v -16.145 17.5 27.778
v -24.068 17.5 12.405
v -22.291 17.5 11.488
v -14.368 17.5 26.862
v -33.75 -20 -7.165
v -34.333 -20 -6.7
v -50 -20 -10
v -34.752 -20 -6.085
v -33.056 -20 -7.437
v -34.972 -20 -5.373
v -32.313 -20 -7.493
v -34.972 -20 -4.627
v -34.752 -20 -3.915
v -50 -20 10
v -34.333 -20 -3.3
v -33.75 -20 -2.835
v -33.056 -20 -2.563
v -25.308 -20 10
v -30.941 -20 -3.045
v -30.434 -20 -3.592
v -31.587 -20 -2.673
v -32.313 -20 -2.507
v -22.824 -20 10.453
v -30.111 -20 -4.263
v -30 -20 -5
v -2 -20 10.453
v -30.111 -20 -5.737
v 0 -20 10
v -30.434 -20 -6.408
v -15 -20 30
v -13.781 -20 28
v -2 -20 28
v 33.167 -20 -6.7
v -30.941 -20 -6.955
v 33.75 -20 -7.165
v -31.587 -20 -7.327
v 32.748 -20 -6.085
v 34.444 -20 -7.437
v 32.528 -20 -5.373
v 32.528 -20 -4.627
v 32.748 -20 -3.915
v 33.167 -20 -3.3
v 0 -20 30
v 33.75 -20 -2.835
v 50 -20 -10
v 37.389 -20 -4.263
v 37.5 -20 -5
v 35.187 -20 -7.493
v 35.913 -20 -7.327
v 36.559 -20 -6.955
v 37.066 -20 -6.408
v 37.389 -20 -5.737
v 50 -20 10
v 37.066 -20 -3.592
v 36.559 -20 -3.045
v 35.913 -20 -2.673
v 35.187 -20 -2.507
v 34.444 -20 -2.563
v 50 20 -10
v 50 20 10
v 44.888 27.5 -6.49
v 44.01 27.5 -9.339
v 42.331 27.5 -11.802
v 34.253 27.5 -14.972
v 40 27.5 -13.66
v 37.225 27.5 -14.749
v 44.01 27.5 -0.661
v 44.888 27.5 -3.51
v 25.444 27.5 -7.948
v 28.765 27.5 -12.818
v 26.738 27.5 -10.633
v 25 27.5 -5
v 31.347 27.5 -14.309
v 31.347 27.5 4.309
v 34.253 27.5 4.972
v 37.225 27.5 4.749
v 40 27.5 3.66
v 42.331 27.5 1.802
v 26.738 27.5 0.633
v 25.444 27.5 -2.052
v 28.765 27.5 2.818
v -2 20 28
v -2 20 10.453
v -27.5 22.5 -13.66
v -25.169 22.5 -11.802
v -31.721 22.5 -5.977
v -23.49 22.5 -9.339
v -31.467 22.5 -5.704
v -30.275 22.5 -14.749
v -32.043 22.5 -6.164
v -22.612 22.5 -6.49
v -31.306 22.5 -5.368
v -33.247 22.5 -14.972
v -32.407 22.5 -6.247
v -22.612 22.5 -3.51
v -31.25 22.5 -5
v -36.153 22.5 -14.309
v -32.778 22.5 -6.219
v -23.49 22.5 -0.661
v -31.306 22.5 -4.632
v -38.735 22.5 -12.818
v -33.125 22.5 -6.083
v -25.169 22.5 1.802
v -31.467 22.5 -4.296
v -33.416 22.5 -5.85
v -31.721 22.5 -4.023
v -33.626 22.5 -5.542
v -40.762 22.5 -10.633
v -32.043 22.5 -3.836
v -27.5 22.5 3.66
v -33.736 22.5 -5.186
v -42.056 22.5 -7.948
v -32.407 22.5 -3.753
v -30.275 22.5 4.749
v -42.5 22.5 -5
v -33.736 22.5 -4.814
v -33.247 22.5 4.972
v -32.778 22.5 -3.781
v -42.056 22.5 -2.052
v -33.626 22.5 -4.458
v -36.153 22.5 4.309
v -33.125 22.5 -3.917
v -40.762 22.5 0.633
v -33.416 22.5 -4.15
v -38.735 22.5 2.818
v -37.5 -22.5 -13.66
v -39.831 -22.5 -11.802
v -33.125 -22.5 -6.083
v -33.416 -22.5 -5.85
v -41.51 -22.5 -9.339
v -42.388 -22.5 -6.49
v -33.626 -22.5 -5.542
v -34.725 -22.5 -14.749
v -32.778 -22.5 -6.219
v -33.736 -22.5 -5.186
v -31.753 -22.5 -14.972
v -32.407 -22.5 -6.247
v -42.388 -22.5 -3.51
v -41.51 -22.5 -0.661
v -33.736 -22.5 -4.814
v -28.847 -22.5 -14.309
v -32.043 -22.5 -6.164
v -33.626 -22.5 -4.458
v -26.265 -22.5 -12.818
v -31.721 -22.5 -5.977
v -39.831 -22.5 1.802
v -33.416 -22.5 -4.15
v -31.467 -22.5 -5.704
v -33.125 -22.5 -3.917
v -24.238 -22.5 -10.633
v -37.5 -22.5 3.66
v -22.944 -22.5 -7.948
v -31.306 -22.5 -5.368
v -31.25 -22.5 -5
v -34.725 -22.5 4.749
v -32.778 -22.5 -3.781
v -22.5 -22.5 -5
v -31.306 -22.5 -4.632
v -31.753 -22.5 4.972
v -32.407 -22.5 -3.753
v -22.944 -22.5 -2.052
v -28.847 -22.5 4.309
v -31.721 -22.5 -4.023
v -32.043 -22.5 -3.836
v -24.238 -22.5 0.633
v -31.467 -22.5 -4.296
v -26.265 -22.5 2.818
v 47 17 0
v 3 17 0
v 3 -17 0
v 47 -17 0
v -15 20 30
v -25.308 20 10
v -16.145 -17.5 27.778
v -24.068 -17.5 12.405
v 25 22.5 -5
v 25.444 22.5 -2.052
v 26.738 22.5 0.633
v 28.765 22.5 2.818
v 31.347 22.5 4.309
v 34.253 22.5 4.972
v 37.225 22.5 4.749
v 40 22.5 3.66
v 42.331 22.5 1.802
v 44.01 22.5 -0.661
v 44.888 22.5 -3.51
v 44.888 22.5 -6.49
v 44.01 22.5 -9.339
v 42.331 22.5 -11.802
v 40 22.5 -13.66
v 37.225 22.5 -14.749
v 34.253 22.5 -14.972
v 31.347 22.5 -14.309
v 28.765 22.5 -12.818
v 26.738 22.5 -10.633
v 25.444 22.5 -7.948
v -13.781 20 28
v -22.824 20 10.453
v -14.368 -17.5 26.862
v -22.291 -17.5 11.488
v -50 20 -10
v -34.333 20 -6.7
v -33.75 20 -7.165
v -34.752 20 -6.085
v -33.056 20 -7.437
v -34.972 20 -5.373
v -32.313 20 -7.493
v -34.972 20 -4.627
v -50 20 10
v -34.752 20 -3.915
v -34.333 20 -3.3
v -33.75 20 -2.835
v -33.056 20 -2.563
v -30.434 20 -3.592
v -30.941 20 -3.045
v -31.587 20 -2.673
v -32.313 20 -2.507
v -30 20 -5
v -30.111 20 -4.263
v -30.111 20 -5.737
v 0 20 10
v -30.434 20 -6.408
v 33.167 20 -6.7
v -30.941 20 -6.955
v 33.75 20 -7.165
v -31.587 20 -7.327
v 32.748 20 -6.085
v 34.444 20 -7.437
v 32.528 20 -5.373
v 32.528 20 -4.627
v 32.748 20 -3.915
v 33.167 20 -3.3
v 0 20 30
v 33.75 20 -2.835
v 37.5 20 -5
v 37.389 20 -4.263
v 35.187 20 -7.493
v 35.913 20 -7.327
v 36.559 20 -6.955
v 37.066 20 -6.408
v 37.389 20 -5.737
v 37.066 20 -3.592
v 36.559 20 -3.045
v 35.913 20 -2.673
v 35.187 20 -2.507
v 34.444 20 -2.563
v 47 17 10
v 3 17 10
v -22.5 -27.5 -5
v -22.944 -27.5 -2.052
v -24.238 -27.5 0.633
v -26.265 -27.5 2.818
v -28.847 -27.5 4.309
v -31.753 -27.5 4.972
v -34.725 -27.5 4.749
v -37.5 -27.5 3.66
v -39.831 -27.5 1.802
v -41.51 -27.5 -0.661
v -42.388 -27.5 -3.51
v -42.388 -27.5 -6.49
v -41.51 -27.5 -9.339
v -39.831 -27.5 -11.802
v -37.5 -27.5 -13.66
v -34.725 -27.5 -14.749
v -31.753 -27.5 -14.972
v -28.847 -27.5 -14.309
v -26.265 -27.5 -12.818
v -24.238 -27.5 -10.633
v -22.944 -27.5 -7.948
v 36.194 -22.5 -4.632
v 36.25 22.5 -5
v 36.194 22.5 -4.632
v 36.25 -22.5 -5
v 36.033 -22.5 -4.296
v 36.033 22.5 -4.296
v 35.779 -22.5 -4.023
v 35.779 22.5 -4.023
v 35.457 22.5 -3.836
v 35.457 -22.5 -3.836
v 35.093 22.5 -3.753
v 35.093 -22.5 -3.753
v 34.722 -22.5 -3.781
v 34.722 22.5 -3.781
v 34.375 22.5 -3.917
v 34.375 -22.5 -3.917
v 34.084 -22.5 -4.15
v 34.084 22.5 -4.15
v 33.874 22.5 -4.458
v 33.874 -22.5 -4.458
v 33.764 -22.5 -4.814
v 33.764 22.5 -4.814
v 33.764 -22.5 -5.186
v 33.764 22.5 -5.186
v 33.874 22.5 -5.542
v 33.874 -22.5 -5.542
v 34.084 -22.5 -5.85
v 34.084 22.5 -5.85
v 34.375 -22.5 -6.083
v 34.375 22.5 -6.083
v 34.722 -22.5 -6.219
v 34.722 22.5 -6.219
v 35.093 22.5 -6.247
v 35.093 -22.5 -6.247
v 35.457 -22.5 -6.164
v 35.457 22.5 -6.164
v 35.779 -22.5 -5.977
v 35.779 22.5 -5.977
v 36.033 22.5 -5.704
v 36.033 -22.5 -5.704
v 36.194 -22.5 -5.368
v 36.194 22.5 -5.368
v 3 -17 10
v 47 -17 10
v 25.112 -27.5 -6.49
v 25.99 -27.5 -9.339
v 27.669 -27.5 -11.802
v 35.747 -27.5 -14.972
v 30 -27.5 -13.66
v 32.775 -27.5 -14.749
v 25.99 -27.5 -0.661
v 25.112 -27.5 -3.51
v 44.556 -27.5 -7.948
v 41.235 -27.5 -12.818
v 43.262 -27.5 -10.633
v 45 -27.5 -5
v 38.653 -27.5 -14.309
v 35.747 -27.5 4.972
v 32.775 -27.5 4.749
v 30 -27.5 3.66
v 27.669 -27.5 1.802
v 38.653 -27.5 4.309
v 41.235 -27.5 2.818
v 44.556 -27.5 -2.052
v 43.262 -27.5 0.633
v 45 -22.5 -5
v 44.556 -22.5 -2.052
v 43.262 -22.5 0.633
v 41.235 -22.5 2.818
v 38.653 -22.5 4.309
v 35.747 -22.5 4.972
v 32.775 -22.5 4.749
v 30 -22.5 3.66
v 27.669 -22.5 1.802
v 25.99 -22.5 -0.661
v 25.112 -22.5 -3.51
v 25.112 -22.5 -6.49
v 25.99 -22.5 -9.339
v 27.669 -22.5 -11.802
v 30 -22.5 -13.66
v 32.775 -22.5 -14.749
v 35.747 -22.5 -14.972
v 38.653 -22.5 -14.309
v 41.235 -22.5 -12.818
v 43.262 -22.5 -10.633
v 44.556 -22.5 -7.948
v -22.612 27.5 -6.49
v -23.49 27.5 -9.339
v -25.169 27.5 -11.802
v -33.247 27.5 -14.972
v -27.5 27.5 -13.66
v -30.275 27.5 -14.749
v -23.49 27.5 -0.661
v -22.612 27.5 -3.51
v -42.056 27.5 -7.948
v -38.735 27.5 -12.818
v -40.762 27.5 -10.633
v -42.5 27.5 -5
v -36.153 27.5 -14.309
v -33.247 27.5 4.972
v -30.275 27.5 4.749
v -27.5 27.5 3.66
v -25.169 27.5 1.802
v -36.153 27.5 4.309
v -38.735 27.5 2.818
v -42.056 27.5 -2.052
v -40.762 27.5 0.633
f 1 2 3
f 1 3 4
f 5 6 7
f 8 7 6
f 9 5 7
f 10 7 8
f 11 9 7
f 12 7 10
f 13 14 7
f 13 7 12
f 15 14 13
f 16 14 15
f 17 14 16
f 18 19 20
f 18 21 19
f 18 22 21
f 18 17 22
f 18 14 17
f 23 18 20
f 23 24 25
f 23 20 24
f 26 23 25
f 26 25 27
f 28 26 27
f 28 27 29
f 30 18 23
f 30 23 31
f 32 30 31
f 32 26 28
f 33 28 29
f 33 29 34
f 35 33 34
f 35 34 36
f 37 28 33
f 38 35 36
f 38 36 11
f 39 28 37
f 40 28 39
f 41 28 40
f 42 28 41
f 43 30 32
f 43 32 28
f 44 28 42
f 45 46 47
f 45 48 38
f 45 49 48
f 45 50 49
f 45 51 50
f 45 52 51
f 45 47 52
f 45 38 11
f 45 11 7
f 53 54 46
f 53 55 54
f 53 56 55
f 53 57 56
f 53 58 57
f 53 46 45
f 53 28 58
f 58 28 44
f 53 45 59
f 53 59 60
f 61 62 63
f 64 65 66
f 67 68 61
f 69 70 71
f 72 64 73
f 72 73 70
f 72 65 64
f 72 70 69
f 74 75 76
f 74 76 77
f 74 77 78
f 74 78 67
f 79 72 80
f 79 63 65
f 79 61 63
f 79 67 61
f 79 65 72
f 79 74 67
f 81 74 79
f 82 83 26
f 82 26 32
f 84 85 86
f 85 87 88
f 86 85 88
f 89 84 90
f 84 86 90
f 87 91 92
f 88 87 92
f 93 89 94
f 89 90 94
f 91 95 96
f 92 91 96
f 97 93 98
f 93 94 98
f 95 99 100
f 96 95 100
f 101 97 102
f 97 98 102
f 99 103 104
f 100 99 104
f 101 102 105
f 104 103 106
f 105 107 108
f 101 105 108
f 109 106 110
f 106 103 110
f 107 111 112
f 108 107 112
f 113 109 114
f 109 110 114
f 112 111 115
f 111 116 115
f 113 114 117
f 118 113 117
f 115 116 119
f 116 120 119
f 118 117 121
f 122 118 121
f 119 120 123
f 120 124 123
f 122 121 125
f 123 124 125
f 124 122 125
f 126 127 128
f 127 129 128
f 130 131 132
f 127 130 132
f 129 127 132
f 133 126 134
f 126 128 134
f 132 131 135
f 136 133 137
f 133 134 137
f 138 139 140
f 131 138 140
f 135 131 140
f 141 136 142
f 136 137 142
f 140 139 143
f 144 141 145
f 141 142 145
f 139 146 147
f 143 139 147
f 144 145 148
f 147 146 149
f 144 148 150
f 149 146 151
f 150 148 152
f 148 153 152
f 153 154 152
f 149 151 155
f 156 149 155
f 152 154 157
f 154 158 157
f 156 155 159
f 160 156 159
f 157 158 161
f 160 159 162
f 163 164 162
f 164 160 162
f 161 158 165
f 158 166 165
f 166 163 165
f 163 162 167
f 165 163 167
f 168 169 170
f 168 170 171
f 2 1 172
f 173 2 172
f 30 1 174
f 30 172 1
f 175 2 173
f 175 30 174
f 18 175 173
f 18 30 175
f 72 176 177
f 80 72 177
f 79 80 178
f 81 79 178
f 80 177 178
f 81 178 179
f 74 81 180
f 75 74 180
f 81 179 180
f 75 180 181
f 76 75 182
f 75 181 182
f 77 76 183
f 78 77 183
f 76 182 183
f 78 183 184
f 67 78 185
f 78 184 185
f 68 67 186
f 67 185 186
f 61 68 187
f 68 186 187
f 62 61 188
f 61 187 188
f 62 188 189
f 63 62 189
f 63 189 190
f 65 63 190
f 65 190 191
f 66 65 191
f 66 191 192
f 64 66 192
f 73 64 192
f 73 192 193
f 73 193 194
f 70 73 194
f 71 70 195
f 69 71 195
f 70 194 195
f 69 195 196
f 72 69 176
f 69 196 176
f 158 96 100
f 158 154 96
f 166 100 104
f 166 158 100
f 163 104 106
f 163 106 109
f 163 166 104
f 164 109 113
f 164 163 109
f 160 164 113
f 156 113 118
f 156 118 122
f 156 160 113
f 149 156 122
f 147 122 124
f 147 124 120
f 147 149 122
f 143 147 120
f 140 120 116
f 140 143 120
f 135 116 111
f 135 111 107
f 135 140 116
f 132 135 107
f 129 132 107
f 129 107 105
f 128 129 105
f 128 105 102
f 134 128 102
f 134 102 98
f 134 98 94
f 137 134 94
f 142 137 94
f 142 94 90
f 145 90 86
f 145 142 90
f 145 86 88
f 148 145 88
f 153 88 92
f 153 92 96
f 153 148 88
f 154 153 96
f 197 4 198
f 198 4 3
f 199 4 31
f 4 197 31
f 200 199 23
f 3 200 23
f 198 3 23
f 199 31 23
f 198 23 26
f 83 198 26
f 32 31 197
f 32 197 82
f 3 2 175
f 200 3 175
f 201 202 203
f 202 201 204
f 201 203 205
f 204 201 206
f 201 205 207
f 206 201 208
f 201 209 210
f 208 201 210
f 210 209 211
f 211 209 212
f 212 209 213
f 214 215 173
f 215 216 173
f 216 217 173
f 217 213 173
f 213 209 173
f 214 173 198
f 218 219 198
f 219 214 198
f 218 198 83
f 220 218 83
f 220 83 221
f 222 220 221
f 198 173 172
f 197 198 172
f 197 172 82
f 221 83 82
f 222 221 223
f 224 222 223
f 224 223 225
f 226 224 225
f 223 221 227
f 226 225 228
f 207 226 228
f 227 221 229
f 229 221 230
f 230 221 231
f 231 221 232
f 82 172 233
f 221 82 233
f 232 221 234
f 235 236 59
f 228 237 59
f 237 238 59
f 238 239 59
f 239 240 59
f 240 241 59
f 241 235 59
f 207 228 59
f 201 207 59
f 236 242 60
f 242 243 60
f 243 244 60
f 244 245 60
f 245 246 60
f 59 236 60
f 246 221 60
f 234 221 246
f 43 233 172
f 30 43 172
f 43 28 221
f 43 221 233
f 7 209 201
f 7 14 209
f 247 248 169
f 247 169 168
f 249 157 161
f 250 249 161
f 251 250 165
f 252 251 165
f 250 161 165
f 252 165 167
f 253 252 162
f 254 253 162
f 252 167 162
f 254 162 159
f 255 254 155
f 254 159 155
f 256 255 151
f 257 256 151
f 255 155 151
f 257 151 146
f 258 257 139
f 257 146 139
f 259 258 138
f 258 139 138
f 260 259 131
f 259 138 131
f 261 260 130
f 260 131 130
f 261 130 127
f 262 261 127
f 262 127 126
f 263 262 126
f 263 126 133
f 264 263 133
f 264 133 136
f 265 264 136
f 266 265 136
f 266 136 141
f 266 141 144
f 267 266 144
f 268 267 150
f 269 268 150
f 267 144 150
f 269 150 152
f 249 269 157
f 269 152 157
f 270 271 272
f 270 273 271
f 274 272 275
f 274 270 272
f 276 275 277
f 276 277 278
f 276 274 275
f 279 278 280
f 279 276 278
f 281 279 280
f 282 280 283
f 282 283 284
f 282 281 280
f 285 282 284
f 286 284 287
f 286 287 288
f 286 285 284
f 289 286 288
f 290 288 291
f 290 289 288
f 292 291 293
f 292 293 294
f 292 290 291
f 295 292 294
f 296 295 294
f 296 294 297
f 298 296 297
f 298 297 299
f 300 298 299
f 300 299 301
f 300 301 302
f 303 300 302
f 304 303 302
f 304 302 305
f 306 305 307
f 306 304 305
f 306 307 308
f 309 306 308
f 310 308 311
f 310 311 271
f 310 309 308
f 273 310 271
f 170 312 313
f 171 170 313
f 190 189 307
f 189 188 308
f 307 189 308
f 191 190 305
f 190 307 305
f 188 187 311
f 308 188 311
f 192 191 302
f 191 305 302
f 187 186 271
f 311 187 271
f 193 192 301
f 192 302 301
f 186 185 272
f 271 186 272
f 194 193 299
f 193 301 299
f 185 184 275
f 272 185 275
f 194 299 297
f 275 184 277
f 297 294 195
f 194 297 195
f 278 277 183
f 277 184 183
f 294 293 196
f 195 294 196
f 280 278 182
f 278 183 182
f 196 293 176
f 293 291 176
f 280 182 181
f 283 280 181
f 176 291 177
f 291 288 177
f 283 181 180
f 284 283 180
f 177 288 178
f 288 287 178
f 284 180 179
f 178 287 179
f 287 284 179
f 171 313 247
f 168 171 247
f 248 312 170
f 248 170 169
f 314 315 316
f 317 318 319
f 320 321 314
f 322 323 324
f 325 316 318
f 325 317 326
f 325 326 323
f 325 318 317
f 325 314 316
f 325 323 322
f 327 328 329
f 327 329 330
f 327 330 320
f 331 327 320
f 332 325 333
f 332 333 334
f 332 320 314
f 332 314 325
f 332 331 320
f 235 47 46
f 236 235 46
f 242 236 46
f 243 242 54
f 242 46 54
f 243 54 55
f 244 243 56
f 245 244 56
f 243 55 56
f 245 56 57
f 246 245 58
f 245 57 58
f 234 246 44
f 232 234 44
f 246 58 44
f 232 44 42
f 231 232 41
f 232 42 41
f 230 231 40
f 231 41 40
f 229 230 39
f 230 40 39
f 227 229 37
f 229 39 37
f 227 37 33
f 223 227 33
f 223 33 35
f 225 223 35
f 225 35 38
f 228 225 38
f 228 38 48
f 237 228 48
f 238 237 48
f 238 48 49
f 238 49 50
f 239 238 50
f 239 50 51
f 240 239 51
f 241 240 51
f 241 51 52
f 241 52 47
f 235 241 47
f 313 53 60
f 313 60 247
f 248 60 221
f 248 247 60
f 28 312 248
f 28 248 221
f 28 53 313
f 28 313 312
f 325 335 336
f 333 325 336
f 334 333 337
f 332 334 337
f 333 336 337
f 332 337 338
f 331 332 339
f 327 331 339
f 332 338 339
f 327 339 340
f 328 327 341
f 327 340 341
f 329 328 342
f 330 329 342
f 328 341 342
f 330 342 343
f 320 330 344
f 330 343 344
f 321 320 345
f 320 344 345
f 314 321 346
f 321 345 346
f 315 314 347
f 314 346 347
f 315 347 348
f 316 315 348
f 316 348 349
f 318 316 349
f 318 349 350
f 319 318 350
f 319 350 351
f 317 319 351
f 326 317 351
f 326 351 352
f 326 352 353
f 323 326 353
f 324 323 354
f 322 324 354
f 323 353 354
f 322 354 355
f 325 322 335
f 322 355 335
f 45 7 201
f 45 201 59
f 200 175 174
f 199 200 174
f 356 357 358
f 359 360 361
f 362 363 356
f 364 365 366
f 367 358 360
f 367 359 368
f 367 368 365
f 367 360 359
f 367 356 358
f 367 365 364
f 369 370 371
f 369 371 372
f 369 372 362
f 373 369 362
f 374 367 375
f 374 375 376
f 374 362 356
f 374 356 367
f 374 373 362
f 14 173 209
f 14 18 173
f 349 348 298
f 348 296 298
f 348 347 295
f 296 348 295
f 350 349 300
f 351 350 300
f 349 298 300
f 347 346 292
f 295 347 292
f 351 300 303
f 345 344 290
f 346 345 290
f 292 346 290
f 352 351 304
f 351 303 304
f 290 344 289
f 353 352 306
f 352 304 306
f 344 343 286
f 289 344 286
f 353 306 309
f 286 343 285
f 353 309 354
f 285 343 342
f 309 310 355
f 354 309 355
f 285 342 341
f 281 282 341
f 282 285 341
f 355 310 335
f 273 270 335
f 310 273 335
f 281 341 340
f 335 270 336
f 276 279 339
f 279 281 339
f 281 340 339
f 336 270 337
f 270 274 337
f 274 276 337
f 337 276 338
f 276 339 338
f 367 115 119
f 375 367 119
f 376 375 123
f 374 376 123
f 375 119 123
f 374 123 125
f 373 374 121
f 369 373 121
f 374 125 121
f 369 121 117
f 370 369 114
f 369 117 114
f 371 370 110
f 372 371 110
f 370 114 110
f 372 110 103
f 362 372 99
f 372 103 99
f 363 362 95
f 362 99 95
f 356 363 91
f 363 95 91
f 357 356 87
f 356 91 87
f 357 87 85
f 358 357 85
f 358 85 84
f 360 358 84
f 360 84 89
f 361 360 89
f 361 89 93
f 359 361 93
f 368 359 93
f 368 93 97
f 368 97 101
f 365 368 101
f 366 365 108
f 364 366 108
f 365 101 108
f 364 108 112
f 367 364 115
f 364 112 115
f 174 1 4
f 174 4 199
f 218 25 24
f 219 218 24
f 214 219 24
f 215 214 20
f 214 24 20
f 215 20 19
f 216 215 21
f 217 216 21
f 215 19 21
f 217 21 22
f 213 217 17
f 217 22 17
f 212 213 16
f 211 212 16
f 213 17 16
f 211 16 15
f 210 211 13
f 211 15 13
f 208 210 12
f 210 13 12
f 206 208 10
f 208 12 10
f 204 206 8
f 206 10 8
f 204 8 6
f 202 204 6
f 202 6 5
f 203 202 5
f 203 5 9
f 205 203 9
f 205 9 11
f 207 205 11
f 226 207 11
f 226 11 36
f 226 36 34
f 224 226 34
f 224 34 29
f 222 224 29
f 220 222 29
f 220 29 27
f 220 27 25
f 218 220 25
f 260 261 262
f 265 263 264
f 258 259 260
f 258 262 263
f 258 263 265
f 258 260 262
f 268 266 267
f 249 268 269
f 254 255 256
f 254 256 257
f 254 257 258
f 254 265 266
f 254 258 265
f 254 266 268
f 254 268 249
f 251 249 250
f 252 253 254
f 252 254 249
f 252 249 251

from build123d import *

# Parameters (mm, degrees)
F0_R       = 2.5
F1_DEPTH   = 20
F2_R       = 2.5
F3_DEPTH   = 40.001
F4_W       = 44
F4_H       = 34
F5_DEPTH   = 10
F6_R       = 1.25
F8_DEPTH   = 42.5
F7_R       = 1.25
F9_DEPTH   = 2.5
F10_R      = 1.25
F11_DEPTH  = 42.5
F11_FACE_R = 1.25
F12_DEPTH  = 2.5
F16_R      = 10
F17_DEPTH  = 5
F14_R      = 10
F18_DEPTH  = 5
F13_R      = 10
F19_DEPTH  = 5
F15_R      = 10
F20_DEPTH  = 5
F21_W      = 35
F21_H      = 17.294839
F22_DEPTH  = 2.8
F23_W      = 11.780776
F23_H      = 17.5466
F24_DEPTH  = 50.6


with BuildPart() as f1:
    # F0 (on Front) → F1 (new body, symmetric)
    with BuildSketch(Plane.XZ):
        Polygon((-25.30775, 10), (-50, 10), (-50, -10), (50, -10), (50, 10), (0, 10), align=None)
        with Locations((-35, -5)):
            Circle(F0_R, mode=Mode.SUBTRACT)
        with Locations((35, -5)):
            Circle(F0_R, mode=Mode.SUBTRACT)
        Polygon((-15, 30), (-25.30775, 10), (0, 10), (0, 30), align=None)
        with Locations((-35, -5)):
            Circle(F0_R)
        with Locations((35, -5)):
            Circle(F0_R)
    extrude(amount=F1_DEPTH, both=True)

    # F2 (on face) → F3 (cut, through all)
    with BuildSketch(Plane.XZ.offset(20)):
        with Locations((-32.5, -5)):
            Circle(F2_R)
        with Locations((35, -5)):
            Circle(F2_R)
    extrude(amount=-F3_DEPTH, mode=Mode.SUBTRACT)

    # F4 (on face) → F5 (cut)
    with BuildSketch(Plane.XY.offset(10)):
        with Locations((25, 0)):
            Rectangle(F4_W, F4_H)
    extrude(amount=-F5_DEPTH, mode=Mode.SUBTRACT)

    # F21 (on face) → F22 (cut)
    with BuildSketch(Plane(origin=(-24.068458, 0, 12.404583), x_dir=(0, -1, 0), z_dir=(-0.888889, 0, 0.458122))):
        with Locations((0, 8.647419)):
            Rectangle(F21_W, F21_H)
    extrude(amount=-F22_DEPTH, mode=Mode.SUBTRACT)

    # F23 (on face) → F24 (cut)
    with BuildSketch(Plane.XZ.offset(20)):
        Polygon((-13.780776, 10.4534), (-13.780776, 28), (-22.824074, 10.4534), align=None)
        with Locations((-7.890388, 19.2267)):
            Rectangle(F23_W, F23_H)
    extrude(amount=-F24_DEPTH, mode=Mode.SUBTRACT)


with BuildPart() as f8:
    # F6 (on face) → F8 (new body)
    with BuildSketch(Plane.XZ.offset(20)):
        with Locations((35, -5)):
            Circle(F6_R)
    extrude(amount=-F8_DEPTH)

    # F7 (on face) → F9 (join)
    with BuildSketch(Plane.XZ.offset(20)):
        with Locations((35, -5)):
            Circle(F7_R)
    extrude(amount=F9_DEPTH)

    # F16 (on face) → F17 (join)
    with BuildSketch(Plane(origin=(0, 22.5, 0), x_dir=(-1, 0, 0), z_dir=(0, 1, 0))):
        with Locations((-35, -5)):
            Circle(F16_R)
    extrude(amount=F17_DEPTH)

    # F14 (on face) → F18 (join)
    with BuildSketch(Plane.XZ.offset(22.5)):
        with Locations((35, -5)):
            Circle(F14_R)
    extrude(amount=F18_DEPTH)


with BuildPart() as f11:
    # F10 (on face) → F11 (new body)
    with BuildSketch(Plane.XZ.offset(20)):
        with Locations((-32.5, -5)):
            Circle(F10_R)
    extrude(amount=-F11_DEPTH)

    # F11_face (on face) → F12 (join)
    with BuildSketch(Plane(origin=(-32.5, -20, -5), x_dir=(1, 0, 0), z_dir=(0, -1, 0))):
        Circle(F11_FACE_R)
    extrude(amount=F12_DEPTH)

    # F13 (on face) → F19 (join)
    with BuildSketch(Plane.XZ.offset(22.5)):
        with Locations((-32.5, -5)):
            Circle(F13_R)
    extrude(amount=F19_DEPTH)

    # F15 (on face) → F20 (join)
    with BuildSketch(Plane(origin=(0, 22.5, 0), x_dir=(-1, 0, 0), z_dir=(0, 1, 0))):
        with Locations((32.5, -5)):
            Circle(F15_R)
    extrude(amount=F20_DEPTH)


solid = Compound([f1.part, f8.part, f11.part])
